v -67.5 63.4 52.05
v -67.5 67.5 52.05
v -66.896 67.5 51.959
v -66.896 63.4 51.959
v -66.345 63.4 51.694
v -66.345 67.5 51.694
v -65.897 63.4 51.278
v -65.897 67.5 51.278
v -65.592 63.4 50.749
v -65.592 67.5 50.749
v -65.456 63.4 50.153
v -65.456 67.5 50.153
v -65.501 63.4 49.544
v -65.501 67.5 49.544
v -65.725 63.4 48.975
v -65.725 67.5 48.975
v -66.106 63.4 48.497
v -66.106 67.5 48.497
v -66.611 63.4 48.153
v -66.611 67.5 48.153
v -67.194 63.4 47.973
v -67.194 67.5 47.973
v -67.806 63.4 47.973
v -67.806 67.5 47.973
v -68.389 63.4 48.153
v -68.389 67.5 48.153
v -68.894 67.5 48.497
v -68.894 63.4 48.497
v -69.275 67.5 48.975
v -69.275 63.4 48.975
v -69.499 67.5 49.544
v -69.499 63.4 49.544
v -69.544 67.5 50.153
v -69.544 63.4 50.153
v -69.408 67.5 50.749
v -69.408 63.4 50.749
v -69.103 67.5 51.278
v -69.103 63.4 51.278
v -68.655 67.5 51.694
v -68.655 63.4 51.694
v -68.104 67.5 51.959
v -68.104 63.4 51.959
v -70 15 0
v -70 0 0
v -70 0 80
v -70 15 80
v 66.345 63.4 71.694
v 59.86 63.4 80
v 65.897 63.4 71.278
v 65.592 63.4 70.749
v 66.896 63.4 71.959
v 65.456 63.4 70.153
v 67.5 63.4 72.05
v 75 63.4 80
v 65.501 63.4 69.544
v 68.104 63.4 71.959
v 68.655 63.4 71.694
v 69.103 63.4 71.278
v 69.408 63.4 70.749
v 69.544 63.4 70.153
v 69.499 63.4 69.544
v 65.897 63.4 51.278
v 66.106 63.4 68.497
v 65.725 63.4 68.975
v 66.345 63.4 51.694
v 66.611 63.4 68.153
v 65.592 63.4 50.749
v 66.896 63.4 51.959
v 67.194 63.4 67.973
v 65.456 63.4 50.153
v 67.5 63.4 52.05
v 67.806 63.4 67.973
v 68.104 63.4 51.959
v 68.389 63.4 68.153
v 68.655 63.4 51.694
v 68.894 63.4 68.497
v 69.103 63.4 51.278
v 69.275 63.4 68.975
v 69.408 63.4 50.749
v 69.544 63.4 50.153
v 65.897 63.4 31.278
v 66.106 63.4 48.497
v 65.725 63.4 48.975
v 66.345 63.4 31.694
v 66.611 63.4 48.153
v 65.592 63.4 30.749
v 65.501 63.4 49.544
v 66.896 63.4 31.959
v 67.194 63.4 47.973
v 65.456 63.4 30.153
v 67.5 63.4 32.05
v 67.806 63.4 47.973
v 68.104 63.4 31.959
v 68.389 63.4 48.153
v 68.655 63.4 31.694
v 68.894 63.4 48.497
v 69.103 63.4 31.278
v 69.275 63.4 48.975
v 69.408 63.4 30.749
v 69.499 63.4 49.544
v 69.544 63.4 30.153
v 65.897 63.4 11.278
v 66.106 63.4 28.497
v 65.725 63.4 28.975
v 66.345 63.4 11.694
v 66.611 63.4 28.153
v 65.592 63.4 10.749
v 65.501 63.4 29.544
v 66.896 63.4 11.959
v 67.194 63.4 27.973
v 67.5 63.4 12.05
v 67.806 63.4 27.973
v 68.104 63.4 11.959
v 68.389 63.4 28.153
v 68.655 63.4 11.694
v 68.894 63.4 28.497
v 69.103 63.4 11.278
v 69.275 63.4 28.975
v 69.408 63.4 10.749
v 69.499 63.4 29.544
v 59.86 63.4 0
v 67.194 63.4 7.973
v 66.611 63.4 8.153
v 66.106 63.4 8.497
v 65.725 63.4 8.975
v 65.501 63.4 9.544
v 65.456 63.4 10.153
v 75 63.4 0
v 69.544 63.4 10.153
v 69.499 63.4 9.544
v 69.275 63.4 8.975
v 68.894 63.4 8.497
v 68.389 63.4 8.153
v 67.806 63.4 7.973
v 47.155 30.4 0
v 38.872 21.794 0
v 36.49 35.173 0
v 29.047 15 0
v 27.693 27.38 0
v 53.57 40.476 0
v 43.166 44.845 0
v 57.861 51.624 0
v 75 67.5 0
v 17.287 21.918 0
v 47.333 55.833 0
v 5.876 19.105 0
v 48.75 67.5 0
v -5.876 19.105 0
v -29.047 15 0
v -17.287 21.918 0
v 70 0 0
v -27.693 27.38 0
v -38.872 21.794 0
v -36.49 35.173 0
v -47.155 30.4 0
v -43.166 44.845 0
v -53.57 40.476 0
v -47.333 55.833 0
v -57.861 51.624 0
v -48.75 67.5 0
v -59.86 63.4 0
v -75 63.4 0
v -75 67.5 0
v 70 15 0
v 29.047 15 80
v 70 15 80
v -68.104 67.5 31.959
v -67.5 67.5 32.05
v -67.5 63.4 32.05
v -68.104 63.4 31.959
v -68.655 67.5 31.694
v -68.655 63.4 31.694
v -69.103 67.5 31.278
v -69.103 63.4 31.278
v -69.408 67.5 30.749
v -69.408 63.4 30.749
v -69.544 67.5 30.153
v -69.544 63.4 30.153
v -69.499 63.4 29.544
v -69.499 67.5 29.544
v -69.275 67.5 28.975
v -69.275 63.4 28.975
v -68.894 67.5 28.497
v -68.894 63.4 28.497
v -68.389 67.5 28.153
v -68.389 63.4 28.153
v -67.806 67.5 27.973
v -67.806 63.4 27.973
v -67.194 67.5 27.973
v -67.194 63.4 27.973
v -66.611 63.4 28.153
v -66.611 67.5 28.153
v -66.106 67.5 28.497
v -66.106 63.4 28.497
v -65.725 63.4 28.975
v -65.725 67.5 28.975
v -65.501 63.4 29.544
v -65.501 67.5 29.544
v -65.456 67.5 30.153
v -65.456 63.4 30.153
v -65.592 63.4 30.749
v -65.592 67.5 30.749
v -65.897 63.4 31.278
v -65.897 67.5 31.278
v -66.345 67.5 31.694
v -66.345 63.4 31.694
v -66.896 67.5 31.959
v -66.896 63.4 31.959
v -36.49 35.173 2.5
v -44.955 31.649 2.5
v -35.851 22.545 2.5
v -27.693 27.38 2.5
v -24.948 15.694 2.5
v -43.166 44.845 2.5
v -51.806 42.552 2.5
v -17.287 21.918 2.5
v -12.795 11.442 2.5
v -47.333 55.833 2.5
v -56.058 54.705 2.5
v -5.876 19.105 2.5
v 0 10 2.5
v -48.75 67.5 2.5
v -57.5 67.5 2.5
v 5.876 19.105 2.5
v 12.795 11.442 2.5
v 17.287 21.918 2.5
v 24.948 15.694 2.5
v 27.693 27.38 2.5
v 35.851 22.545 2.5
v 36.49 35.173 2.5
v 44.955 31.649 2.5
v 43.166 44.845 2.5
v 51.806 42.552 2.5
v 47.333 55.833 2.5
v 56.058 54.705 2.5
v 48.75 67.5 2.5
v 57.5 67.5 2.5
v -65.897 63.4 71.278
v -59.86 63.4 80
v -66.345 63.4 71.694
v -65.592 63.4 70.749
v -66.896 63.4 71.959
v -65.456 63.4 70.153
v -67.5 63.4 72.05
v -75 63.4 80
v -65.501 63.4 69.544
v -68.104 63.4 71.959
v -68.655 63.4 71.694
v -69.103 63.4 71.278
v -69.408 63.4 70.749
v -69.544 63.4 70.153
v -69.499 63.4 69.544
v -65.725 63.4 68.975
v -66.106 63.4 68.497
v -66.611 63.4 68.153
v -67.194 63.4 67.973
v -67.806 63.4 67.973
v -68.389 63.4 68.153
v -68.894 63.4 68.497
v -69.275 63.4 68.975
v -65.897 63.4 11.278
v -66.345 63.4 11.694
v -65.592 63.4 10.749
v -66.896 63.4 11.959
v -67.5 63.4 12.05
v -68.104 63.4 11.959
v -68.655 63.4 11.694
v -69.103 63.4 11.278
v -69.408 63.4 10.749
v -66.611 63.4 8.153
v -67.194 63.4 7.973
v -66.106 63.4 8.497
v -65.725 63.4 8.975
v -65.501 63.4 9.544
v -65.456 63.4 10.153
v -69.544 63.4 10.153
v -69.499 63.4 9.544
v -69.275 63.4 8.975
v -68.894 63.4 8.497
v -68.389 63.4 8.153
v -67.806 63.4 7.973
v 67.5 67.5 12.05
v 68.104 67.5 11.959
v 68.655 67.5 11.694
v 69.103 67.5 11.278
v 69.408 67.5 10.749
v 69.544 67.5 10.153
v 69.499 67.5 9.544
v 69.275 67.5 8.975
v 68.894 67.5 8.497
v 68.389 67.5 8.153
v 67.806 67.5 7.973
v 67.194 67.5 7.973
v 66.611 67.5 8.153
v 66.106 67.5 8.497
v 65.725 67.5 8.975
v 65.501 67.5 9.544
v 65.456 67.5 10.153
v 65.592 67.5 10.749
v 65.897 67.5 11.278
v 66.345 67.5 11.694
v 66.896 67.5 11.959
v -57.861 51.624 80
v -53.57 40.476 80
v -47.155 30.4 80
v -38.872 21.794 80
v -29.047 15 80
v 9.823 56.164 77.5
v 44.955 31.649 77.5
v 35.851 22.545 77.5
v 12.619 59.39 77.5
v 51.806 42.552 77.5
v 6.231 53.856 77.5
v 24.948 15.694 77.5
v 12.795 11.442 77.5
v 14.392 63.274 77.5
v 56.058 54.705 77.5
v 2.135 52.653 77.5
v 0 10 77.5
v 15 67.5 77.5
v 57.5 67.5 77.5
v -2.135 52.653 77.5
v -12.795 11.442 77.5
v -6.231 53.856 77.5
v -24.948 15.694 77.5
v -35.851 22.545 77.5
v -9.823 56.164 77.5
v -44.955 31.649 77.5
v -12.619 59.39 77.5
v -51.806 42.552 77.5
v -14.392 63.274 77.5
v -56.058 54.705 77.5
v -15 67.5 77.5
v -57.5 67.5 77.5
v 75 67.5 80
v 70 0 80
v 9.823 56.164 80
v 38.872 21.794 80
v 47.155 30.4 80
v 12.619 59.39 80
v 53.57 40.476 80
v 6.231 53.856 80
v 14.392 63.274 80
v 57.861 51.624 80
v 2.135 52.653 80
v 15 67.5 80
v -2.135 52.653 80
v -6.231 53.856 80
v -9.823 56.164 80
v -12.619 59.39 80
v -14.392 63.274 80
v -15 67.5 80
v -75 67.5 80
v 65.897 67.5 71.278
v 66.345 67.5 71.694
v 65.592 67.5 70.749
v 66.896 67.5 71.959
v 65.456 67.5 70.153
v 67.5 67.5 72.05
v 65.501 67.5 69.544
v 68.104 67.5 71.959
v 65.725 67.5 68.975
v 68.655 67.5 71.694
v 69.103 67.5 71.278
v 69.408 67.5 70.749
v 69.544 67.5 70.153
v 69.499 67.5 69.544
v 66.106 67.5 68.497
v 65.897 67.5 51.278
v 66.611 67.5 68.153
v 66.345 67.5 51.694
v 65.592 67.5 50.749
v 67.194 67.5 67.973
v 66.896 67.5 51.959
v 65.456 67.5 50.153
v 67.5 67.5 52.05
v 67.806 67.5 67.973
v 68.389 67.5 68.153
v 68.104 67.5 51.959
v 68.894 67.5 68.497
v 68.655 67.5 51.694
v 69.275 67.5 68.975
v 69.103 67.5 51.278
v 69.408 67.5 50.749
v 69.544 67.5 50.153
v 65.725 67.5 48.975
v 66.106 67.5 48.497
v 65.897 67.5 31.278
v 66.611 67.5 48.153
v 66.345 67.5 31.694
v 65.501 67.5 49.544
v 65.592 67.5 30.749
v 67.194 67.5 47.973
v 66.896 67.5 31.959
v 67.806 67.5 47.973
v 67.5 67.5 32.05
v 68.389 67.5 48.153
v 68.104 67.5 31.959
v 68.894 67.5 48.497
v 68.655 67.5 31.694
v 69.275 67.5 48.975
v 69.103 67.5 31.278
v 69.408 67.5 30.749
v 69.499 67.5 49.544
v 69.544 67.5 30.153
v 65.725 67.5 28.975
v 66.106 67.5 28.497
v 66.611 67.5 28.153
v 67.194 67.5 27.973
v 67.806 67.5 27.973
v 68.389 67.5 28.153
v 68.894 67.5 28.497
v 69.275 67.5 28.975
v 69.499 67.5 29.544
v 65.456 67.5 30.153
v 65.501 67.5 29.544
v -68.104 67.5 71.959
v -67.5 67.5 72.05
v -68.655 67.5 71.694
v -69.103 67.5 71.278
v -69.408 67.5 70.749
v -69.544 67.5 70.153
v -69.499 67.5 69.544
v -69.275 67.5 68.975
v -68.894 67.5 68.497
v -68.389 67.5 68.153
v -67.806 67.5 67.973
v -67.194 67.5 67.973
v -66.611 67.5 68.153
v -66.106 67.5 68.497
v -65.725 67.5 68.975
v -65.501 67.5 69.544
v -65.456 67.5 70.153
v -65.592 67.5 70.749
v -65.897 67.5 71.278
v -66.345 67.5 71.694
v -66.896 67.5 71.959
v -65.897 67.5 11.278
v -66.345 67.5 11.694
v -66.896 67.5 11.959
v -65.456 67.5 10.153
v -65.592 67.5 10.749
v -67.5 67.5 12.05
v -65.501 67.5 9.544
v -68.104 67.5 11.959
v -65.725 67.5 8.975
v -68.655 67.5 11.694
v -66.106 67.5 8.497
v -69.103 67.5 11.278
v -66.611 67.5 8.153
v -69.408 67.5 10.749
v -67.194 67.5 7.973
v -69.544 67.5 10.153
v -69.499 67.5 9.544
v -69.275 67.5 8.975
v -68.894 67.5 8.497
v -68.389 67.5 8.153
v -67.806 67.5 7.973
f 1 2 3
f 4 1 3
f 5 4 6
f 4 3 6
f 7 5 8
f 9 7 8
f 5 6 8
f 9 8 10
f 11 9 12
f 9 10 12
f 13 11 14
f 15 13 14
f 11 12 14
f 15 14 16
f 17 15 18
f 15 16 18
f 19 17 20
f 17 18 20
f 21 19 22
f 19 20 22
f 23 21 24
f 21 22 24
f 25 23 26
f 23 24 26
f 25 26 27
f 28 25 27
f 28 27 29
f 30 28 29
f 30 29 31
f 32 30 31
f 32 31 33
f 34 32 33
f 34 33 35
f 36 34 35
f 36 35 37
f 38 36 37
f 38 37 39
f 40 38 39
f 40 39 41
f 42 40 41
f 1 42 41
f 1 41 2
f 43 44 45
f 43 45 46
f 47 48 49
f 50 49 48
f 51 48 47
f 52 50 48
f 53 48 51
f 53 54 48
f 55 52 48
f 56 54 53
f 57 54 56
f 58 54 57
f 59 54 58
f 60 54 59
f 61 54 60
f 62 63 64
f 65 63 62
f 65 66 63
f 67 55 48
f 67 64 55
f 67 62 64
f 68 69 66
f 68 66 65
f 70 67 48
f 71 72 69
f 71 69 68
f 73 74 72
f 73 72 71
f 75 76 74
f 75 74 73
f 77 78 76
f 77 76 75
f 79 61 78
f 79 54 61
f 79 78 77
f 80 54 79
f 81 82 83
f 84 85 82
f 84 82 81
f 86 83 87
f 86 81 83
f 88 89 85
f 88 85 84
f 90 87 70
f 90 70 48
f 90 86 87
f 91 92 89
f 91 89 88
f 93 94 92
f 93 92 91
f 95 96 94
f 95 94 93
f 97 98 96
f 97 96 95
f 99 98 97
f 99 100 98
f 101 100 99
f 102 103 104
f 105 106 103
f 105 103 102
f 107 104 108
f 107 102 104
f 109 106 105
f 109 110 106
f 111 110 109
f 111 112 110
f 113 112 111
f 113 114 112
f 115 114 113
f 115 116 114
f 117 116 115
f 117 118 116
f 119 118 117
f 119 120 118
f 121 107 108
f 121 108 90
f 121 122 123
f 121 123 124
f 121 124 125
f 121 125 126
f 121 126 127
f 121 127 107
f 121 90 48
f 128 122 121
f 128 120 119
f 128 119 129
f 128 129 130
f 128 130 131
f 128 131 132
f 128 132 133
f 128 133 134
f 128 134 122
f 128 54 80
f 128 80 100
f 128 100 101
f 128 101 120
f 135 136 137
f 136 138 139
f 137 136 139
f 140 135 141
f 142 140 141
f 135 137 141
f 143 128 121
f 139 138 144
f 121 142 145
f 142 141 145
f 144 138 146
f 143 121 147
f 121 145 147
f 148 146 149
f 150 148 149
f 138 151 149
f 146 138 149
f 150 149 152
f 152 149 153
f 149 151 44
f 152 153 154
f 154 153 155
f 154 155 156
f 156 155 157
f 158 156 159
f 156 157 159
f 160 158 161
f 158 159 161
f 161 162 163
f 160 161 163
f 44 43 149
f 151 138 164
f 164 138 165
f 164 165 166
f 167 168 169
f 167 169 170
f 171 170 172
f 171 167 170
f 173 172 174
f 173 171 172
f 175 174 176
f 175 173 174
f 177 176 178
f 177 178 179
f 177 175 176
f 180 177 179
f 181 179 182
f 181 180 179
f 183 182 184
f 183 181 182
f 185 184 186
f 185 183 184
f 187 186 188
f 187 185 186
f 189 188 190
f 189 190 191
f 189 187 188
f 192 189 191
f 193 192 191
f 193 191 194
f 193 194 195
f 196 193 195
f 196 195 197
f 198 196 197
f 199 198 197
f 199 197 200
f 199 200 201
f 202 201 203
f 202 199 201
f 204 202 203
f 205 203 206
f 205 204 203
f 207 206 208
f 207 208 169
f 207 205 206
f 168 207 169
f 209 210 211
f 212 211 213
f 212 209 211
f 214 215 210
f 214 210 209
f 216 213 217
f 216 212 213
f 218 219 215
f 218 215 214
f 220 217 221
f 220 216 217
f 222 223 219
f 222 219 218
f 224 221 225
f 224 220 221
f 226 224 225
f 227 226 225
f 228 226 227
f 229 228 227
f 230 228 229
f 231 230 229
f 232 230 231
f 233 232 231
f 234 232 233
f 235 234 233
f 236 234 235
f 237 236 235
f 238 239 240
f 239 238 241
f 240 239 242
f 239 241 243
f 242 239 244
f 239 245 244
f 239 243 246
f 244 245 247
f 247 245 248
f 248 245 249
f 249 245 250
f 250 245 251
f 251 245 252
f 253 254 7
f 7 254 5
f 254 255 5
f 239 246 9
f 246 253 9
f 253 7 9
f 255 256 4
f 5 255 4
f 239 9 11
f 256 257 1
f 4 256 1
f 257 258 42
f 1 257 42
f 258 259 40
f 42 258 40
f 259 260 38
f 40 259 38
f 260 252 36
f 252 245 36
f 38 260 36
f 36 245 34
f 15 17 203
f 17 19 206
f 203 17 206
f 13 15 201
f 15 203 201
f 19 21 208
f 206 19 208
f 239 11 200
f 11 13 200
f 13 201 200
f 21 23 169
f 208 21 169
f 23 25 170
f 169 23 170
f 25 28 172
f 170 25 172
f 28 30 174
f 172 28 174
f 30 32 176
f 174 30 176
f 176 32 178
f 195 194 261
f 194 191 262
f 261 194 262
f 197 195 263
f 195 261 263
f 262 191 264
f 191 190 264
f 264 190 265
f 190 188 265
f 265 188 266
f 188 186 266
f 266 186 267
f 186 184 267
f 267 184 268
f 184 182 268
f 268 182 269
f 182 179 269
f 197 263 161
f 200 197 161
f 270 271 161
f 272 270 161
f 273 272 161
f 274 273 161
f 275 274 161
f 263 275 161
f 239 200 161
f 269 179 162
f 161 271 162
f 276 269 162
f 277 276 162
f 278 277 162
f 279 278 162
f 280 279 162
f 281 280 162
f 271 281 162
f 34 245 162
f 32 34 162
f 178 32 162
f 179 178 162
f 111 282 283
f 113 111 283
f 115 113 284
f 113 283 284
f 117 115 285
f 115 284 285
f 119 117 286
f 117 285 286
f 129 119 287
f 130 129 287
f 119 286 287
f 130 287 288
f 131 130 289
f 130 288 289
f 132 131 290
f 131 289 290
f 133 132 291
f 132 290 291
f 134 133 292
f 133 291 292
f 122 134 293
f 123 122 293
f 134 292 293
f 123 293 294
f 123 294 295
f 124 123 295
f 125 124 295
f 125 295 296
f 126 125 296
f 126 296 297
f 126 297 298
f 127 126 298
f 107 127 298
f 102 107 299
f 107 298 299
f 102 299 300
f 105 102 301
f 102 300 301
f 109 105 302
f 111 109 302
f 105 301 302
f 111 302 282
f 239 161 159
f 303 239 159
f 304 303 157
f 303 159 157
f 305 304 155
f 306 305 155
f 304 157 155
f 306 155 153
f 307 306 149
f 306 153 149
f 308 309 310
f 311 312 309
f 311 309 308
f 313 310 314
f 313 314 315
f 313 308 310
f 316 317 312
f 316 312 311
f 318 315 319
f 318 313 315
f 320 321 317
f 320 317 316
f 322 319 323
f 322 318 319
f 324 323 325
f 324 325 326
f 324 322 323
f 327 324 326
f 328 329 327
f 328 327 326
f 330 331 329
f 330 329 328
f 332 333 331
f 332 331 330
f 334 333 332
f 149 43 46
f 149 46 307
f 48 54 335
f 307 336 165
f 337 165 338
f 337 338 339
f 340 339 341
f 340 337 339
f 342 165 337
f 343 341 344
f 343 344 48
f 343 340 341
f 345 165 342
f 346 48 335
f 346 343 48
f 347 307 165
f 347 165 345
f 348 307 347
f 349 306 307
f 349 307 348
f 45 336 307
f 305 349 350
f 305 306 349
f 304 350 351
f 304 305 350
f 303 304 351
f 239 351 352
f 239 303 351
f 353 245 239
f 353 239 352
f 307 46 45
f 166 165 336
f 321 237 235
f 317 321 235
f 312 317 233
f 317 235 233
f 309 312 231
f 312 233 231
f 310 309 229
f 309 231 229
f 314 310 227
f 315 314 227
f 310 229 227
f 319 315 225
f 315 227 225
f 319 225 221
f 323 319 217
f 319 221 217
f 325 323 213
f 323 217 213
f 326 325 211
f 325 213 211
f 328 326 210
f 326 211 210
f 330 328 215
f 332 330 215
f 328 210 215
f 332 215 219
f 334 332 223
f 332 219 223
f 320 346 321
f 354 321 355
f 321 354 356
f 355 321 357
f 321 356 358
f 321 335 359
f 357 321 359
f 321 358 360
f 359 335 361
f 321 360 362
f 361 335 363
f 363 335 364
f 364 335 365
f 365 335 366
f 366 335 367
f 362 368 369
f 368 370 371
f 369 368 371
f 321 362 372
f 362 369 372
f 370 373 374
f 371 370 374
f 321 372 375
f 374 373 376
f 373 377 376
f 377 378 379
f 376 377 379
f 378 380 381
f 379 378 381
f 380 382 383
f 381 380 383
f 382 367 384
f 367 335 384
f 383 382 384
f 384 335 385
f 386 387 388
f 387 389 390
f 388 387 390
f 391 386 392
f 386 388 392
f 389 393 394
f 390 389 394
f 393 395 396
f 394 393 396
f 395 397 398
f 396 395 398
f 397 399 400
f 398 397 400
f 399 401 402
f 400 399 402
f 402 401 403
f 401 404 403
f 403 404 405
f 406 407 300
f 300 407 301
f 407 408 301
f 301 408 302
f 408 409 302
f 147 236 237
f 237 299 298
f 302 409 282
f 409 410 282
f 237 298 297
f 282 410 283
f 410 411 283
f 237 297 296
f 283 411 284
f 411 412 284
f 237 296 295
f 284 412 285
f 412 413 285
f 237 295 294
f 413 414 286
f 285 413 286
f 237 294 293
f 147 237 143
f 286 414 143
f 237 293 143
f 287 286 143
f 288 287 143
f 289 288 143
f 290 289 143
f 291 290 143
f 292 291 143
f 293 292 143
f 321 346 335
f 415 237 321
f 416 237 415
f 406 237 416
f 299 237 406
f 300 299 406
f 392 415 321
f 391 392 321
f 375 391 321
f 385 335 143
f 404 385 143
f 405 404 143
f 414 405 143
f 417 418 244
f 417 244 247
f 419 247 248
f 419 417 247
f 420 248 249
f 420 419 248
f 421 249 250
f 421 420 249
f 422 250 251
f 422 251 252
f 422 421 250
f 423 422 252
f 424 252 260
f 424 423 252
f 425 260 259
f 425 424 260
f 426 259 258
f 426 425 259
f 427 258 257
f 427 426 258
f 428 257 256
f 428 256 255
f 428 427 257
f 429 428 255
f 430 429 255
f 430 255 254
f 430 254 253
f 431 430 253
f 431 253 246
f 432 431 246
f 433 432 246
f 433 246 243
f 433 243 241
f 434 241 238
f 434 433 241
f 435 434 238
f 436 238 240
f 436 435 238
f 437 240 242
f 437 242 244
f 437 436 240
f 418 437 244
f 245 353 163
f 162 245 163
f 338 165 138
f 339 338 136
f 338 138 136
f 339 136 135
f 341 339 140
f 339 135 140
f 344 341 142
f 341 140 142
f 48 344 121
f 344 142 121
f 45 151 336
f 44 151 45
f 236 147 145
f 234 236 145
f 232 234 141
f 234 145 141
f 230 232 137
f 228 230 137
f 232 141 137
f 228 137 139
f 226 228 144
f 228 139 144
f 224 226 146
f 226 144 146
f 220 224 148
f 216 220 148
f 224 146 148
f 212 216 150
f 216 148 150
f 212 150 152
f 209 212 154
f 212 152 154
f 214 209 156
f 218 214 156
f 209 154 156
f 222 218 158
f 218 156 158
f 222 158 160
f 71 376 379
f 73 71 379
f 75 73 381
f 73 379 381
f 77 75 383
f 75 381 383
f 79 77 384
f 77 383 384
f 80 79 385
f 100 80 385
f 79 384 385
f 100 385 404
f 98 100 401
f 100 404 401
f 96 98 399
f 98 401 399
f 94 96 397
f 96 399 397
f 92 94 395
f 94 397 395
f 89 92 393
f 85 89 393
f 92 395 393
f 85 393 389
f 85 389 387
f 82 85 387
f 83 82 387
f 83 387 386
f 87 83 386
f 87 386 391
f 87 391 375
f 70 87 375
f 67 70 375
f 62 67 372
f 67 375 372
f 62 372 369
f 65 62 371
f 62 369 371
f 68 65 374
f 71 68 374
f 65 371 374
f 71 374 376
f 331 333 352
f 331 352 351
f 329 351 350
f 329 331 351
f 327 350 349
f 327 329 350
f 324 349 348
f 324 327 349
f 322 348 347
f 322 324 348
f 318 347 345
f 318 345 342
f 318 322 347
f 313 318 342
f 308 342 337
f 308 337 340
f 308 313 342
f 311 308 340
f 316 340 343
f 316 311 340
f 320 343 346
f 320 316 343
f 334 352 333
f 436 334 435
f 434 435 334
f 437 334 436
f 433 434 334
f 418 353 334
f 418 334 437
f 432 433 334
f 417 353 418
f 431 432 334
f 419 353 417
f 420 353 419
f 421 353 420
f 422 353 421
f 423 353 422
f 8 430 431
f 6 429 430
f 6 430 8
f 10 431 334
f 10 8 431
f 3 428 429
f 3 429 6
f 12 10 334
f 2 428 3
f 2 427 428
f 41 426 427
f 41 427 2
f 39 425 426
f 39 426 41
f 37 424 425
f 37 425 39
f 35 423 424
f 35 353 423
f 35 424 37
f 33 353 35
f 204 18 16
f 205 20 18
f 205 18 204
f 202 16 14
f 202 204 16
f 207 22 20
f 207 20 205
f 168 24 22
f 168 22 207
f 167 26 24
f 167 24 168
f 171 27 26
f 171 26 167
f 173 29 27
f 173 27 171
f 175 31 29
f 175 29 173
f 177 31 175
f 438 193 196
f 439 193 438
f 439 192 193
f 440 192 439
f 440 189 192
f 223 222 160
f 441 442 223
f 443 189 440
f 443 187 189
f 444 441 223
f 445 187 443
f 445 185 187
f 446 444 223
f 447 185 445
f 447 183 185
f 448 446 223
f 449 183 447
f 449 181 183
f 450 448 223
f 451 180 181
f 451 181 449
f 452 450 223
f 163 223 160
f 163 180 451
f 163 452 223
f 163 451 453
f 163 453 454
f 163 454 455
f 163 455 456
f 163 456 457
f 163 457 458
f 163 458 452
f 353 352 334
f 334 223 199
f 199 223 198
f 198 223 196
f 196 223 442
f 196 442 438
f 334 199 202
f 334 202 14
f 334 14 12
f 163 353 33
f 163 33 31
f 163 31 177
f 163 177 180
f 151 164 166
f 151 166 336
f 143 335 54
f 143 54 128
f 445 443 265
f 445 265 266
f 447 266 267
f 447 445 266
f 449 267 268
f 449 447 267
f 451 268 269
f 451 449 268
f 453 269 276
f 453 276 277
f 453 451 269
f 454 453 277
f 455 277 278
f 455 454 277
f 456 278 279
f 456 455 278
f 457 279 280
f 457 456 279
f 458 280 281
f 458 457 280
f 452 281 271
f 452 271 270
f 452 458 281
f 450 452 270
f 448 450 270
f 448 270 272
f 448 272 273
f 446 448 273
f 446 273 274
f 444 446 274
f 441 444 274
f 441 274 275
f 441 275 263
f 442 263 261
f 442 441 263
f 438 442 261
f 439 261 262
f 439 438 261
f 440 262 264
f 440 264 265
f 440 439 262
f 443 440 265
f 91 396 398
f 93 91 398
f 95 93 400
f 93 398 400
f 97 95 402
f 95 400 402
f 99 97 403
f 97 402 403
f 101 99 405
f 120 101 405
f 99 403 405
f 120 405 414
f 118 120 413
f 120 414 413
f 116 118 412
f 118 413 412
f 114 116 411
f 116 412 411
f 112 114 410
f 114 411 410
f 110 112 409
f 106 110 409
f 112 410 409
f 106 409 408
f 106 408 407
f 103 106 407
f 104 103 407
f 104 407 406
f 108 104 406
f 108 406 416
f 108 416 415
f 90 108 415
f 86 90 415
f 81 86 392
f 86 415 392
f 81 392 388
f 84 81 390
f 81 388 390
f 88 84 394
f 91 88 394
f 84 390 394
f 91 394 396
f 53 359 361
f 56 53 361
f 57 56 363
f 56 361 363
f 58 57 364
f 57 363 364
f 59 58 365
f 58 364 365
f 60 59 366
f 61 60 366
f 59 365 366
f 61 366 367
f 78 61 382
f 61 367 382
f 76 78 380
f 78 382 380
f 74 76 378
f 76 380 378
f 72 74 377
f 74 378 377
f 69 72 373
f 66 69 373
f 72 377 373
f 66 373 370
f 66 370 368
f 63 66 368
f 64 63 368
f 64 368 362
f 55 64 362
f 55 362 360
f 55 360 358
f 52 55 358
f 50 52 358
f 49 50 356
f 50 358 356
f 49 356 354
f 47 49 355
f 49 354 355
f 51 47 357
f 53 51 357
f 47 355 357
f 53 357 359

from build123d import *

# Parameters (mm, degrees)
BOSS_EXTRUDE1_DEPTH      = 80
BOSS_EXTRUDE2_DEPTH      = 80
BOSS_EXTRUDE3_DEPTH      = 2.5
BOSS_EXTRUDE6_START      = -2.5
BOSS_EXTRUDE6_DEPTH      = 2.5
BOSS_EXTRUDE7_REACH      = 202.922
BOSS_EXTRUDE7_END_RADIUS = 60
BOSS_EXTRUDE7_START      = 75
SKETCH10_W               = 80
SKETCH10_H               = 4.1
SKETCH11_R               = 2.05
CUT_EXTRUDE3_DEPTH       = 4.1
BOSS_EXTRUDE5_REACH      = 205.768
BOSS_EXTRUDE5_START      = -75
SKETCH7_W                = 80
SKETCH7_H                = 4.1
SKETCH8_R                = 2.05
CUT_EXTRUDE2_DEPTH       = 12.5


with BuildPart() as part:
    # Sketch1 → Boss-Extrude1 (new body)
    with BuildSketch(Plane.XY):
        with BuildLine():
            Line((29.047375097, 15), (70, 15))
            Line((70, 15), (70, 0))
            Line((70, 0), (-70, 0))
            Line((-70, 0), (-70, 15))
            Line((-70, 15), (-29.047375097, 15))
            ThreePointArc((-29.047375097, 15), (0, 7.5), (29.047375097, 15))
        make_face()
    extrude(amount=BOSS_EXTRUDE1_DEPTH)

    # Sketch2 → Boss-Extrude2 (add)
    with BuildSketch(Plane(origin=(0, 0, 0), x_dir=(-1, 0, 0), z_dir=(0, 0, -1))):
        with BuildLine():
            Line((-60, 67.5), (-57.5, 67.5))
            ThreePointArc((-57.5, 67.5), (0, 10), (57.5, 67.5))
            Line((57.5, 67.5), (60, 67.5))
            ThreePointArc((60, 67.5), (0, 7.5), (-60, 67.5))
        make_face()
    extrude(amount=-BOSS_EXTRUDE2_DEPTH)

    # Sketch3 → Boss-Extrude3 (add)
    with BuildSketch(Plane(origin=(0, 0, 0), x_dir=(-1, 0, 0), z_dir=(0, 0, -1))):
        with BuildLine():
            Line((-57.5, 67.5), (-48.75, 67.5))
            ThreePointArc((-48.75, 67.5), (0, 18.75), (48.75, 67.5))
            Line((48.75, 67.5), (57.5, 67.5))
            ThreePointArc((57.5, 67.5), (0, 10), (-57.5, 67.5))
        make_face()
    extrude(amount=-BOSS_EXTRUDE3_DEPTH)

    # Sketch9 → Boss-Extrude6 (add)
    with BuildSketch(Plane.XY.offset(80).offset(BOSS_EXTRUDE6_START)):
        with BuildLine():
            Line((-57.5, 67.5), (-15, 67.5))
            ThreePointArc((-15, 67.5), (0, 52.5), (15, 67.5))
            Line((15, 67.5), (57.5, 67.5))
            ThreePointArc((57.5, 67.5), (0, 10), (-57.5, 67.5))
        make_face()
    extrude(amount=BOSS_EXTRUDE6_DEPTH)

    # Boss-Extrude7: up to this cylinder (the profile starts outside it)
    boss_extrude7_end = Plane(origin=(0, 67.5, 40), z_dir=(0, 0, -1)) * Cylinder(BOSS_EXTRUDE7_END_RADIUS, 526.844, mode=Mode.PRIVATE)
    # Sketch10 → Boss-Extrude7 (add, up to the surface)
    with BuildSketch(Plane(origin=(0, 0, 0), x_dir=(0, 0, -1), z_dir=(1, 0, 0)).offset(BOSS_EXTRUDE7_START), mode=Mode.PRIVATE) as boss_extrude7_sk1:
        with Locations((-40, 65.45)):
            Rectangle(SKETCH10_W, SKETCH10_H)
    boss_extrude7_tool1 = extrude(boss_extrude7_sk1.sketch, amount=-BOSS_EXTRUDE7_REACH, mode=Mode.PRIVATE) - boss_extrude7_end
    boss_extrude7 = boss_extrude7_tool1.solids().sort_by_distance((75, 65.45, 40))[0]
    add(boss_extrude7)

    # Sketch11 → Cut-Extrude3 (cut)
    with BuildSketch(Plane(origin=(0, 67.5, 0), x_dir=(1, 0, 0), z_dir=(0, 1, 0))):
        with Locations(Location((67.5, -70, 0), (0, 0, 270))):
            Circle(SKETCH11_R)
        with Locations(Location((67.5, -50, 0), (0, 0, 270))):
            Circle(SKETCH11_R)
        with Locations(Location((67.5, -30, 0), (0, 0, 270))):
            Circle(SKETCH11_R)
        with Locations(Location((67.5, -10, 0), (0, 0, 270))):
            Circle(SKETCH11_R)
    cut_extrude3 = extrude(amount=-CUT_EXTRUDE3_DEPTH, mode=Mode.SUBTRACT)

    # Mirror3: Boss-Extrude7, Cut-Extrude3 across plane
    add(boss_extrude7.mirror(Plane(origin=(0, 0, 0), x_dir=(0, 0, 1), z_dir=(1, 0, 0))))
    add(cut_extrude3.mirror(Plane(origin=(0, 0, 0), x_dir=(0, 0, 1), z_dir=(1, 0, 0))), mode=Mode.SUBTRACT)

    # Sketch7 → Boss-Extrude5 (add, up to next)
    with BuildSketch(Plane(origin=(0, 0, 0), x_dir=(0, 0, -1), z_dir=(1, 0, 0)).offset(BOSS_EXTRUDE5_START), mode=Mode.PRIVATE) as boss_extrude5_sk1:
        with Locations((-40, 65.45)):
            Rectangle(SKETCH7_W, SKETCH7_H)
    boss_extrude5_tool1 = extrude(boss_extrude5_sk1.sketch, amount=BOSS_EXTRUDE5_REACH, mode=Mode.PRIVATE) - part.part
    add(boss_extrude5_tool1.solids().sort_by_distance((-75, 65.45, 40))[0])

    # Sketch8 → Cut-Extrude2 (cut)
    with BuildSketch(Plane(origin=(0, 67.5, 0), x_dir=(1, 0, 0), z_dir=(0, 1, 0))):
        with Locations(Location((-67.5, -10, 0), (0, 0, 270))):
            Circle(SKETCH8_R)
        with Locations(Location((-67.5, -30, 0), (0, 0, 270))):
            Circle(SKETCH8_R)
        with Locations(Location((-67.5, -50, 0), (0, 0, 270))):
            Circle(SKETCH8_R)
        with Locations(Location((-67.5, -70, 0), (0, 0, 270))):
            Circle(SKETCH8_R)
    cut_extrude2 = extrude(amount=-CUT_EXTRUDE2_DEPTH, mode=Mode.SUBTRACT)

    # Mirror2: Cut-Extrude2 across plane
    add(cut_extrude2.mirror(Plane(origin=(0, 0, 0), x_dir=(0, 0, 1), z_dir=(1, 0, 0))), mode=Mode.SUBTRACT)


solid = part.part
